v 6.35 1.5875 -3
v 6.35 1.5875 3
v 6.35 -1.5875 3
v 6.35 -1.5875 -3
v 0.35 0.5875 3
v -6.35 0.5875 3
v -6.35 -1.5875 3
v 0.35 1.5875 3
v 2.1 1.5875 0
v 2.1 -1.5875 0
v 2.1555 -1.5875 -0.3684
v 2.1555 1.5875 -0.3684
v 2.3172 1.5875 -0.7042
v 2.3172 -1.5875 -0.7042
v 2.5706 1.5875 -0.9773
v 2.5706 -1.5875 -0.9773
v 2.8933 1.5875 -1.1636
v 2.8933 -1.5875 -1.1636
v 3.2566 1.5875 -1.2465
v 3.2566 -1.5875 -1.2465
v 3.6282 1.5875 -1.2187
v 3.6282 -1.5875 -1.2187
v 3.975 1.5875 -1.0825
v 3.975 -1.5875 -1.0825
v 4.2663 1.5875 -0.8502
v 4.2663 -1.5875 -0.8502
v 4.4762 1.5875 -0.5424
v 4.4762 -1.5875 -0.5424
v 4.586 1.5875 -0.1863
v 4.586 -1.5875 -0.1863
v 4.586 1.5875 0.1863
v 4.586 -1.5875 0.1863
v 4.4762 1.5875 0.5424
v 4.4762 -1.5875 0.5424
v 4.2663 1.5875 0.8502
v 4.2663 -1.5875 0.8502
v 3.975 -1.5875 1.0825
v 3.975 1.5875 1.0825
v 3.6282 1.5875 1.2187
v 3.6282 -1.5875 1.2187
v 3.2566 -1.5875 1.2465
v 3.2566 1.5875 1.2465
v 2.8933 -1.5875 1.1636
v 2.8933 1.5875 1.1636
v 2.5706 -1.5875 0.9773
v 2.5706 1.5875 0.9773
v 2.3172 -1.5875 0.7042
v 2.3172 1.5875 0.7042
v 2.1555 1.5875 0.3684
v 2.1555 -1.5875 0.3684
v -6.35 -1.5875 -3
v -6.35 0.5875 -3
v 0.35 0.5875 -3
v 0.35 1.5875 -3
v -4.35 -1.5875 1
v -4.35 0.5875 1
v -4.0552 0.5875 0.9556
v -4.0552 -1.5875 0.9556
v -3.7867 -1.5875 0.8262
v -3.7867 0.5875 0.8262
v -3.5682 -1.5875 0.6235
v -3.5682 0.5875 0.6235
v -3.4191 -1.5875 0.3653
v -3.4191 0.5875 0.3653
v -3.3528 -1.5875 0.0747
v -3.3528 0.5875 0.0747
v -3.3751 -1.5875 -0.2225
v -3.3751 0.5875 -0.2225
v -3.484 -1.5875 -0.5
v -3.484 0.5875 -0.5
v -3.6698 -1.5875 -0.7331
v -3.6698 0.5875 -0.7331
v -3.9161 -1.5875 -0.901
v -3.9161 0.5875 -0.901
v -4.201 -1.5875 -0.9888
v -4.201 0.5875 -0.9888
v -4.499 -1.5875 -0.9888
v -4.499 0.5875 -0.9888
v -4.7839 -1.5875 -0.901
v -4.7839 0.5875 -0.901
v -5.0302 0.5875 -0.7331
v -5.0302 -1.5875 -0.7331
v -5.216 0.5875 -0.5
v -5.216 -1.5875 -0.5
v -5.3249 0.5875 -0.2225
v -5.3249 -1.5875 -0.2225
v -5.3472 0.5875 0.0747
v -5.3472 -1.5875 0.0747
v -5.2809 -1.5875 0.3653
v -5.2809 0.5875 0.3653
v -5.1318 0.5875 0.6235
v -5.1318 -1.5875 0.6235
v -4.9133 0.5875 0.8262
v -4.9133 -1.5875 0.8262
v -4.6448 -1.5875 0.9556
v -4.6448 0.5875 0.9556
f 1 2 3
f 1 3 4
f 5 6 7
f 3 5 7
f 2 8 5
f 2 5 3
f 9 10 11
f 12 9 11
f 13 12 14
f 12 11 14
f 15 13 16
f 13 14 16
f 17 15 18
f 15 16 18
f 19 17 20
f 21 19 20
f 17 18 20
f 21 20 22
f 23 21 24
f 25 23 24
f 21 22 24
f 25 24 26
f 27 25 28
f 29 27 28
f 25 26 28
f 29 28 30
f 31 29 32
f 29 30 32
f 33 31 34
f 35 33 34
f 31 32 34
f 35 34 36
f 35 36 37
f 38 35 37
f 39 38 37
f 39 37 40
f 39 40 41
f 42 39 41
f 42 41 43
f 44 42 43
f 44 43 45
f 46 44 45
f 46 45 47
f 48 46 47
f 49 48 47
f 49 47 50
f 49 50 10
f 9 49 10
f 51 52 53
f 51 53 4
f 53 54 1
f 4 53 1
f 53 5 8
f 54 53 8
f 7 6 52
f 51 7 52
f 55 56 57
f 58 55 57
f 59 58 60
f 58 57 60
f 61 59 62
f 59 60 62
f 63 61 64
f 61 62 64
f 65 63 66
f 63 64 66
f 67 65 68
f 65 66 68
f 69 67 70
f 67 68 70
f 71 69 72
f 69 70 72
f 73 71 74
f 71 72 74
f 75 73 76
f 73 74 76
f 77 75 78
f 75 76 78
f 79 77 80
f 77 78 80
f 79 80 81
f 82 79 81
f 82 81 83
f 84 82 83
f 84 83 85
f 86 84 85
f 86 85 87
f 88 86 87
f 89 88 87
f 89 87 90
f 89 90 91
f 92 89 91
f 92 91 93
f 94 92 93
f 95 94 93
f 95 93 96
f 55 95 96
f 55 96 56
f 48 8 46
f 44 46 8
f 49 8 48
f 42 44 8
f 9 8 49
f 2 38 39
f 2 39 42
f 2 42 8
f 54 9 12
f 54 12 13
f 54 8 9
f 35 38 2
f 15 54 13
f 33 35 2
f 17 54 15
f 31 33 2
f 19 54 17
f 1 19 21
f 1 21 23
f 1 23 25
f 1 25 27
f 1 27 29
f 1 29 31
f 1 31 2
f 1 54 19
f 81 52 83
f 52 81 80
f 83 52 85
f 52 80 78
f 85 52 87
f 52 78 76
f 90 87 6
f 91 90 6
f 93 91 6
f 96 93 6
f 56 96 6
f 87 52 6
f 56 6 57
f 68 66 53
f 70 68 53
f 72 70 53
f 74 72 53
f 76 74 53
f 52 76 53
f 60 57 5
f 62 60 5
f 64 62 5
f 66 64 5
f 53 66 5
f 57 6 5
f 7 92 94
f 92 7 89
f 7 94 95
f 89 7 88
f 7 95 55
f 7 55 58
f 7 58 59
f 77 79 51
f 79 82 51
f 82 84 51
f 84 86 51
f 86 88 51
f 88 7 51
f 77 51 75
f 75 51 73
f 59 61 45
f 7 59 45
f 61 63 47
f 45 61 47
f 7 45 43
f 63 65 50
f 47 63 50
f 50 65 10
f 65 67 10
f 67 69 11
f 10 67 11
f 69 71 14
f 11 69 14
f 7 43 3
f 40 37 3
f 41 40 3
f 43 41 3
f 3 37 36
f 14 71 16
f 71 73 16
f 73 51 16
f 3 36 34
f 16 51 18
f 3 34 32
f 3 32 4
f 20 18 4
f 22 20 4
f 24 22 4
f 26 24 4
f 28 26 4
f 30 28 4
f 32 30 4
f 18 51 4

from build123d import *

# Parameters (mm, degrees)
SKETCH1_W             = 12.7
SKETCH1_H             = 6
BOSS_EXTRUDE1_DEPTH   = 1.5875
M3X0_5_TAPPED_HOLE1_D = 2.5
SKETCH4_W             = 6.7
SKETCH4_H             = 1
CUT_EXTRUDE1_DEPTH    = 9.879338728
SKETCH5_R             = 1
CUT_EXTRUDE2_DEPTH    = 8.352083038


with BuildPart() as part:
    # Sketch1 → Boss-Extrude1 (new, symmetric)
    with BuildSketch(Plane(origin=(0, 0, 0), x_dir=(1, 0, 0), z_dir=(0, 1, 0))):
        Rectangle(SKETCH1_W, SKETCH1_H)
    extrude(amount=BOSS_EXTRUDE1_DEPTH, both=True)

    # M3x0.5 Tapped Hole1 (through all)
    with Locations(Plane(origin=(0, 1.5875, 0), x_dir=(1, 0, 0), z_dir=(0, 1, 0))):
        with Locations((3.35, 0)):
            Hole(M3X0_5_TAPPED_HOLE1_D / 2)

    # Sketch4 → Cut-Extrude1 (cut, through all)
    with BuildSketch(Plane.XY.offset(3)):
        with Locations((-3, 1.0875)):
            Rectangle(SKETCH4_W, SKETCH4_H)
    extrude(amount=-CUT_EXTRUDE1_DEPTH, mode=Mode.SUBTRACT)

    # Sketch5 → Cut-Extrude2 (cut, through all)
    with BuildSketch(Plane(origin=(0, 0.5875, 0), x_dir=(1, 0, 0), z_dir=(0, 1, 0))):
        with Locations(Location((-4.35, 0, 0), (0, 0, 270))):
            Circle(SKETCH5_R)
    extrude(amount=-CUT_EXTRUDE2_DEPTH, mode=Mode.SUBTRACT)


solid = part.part
